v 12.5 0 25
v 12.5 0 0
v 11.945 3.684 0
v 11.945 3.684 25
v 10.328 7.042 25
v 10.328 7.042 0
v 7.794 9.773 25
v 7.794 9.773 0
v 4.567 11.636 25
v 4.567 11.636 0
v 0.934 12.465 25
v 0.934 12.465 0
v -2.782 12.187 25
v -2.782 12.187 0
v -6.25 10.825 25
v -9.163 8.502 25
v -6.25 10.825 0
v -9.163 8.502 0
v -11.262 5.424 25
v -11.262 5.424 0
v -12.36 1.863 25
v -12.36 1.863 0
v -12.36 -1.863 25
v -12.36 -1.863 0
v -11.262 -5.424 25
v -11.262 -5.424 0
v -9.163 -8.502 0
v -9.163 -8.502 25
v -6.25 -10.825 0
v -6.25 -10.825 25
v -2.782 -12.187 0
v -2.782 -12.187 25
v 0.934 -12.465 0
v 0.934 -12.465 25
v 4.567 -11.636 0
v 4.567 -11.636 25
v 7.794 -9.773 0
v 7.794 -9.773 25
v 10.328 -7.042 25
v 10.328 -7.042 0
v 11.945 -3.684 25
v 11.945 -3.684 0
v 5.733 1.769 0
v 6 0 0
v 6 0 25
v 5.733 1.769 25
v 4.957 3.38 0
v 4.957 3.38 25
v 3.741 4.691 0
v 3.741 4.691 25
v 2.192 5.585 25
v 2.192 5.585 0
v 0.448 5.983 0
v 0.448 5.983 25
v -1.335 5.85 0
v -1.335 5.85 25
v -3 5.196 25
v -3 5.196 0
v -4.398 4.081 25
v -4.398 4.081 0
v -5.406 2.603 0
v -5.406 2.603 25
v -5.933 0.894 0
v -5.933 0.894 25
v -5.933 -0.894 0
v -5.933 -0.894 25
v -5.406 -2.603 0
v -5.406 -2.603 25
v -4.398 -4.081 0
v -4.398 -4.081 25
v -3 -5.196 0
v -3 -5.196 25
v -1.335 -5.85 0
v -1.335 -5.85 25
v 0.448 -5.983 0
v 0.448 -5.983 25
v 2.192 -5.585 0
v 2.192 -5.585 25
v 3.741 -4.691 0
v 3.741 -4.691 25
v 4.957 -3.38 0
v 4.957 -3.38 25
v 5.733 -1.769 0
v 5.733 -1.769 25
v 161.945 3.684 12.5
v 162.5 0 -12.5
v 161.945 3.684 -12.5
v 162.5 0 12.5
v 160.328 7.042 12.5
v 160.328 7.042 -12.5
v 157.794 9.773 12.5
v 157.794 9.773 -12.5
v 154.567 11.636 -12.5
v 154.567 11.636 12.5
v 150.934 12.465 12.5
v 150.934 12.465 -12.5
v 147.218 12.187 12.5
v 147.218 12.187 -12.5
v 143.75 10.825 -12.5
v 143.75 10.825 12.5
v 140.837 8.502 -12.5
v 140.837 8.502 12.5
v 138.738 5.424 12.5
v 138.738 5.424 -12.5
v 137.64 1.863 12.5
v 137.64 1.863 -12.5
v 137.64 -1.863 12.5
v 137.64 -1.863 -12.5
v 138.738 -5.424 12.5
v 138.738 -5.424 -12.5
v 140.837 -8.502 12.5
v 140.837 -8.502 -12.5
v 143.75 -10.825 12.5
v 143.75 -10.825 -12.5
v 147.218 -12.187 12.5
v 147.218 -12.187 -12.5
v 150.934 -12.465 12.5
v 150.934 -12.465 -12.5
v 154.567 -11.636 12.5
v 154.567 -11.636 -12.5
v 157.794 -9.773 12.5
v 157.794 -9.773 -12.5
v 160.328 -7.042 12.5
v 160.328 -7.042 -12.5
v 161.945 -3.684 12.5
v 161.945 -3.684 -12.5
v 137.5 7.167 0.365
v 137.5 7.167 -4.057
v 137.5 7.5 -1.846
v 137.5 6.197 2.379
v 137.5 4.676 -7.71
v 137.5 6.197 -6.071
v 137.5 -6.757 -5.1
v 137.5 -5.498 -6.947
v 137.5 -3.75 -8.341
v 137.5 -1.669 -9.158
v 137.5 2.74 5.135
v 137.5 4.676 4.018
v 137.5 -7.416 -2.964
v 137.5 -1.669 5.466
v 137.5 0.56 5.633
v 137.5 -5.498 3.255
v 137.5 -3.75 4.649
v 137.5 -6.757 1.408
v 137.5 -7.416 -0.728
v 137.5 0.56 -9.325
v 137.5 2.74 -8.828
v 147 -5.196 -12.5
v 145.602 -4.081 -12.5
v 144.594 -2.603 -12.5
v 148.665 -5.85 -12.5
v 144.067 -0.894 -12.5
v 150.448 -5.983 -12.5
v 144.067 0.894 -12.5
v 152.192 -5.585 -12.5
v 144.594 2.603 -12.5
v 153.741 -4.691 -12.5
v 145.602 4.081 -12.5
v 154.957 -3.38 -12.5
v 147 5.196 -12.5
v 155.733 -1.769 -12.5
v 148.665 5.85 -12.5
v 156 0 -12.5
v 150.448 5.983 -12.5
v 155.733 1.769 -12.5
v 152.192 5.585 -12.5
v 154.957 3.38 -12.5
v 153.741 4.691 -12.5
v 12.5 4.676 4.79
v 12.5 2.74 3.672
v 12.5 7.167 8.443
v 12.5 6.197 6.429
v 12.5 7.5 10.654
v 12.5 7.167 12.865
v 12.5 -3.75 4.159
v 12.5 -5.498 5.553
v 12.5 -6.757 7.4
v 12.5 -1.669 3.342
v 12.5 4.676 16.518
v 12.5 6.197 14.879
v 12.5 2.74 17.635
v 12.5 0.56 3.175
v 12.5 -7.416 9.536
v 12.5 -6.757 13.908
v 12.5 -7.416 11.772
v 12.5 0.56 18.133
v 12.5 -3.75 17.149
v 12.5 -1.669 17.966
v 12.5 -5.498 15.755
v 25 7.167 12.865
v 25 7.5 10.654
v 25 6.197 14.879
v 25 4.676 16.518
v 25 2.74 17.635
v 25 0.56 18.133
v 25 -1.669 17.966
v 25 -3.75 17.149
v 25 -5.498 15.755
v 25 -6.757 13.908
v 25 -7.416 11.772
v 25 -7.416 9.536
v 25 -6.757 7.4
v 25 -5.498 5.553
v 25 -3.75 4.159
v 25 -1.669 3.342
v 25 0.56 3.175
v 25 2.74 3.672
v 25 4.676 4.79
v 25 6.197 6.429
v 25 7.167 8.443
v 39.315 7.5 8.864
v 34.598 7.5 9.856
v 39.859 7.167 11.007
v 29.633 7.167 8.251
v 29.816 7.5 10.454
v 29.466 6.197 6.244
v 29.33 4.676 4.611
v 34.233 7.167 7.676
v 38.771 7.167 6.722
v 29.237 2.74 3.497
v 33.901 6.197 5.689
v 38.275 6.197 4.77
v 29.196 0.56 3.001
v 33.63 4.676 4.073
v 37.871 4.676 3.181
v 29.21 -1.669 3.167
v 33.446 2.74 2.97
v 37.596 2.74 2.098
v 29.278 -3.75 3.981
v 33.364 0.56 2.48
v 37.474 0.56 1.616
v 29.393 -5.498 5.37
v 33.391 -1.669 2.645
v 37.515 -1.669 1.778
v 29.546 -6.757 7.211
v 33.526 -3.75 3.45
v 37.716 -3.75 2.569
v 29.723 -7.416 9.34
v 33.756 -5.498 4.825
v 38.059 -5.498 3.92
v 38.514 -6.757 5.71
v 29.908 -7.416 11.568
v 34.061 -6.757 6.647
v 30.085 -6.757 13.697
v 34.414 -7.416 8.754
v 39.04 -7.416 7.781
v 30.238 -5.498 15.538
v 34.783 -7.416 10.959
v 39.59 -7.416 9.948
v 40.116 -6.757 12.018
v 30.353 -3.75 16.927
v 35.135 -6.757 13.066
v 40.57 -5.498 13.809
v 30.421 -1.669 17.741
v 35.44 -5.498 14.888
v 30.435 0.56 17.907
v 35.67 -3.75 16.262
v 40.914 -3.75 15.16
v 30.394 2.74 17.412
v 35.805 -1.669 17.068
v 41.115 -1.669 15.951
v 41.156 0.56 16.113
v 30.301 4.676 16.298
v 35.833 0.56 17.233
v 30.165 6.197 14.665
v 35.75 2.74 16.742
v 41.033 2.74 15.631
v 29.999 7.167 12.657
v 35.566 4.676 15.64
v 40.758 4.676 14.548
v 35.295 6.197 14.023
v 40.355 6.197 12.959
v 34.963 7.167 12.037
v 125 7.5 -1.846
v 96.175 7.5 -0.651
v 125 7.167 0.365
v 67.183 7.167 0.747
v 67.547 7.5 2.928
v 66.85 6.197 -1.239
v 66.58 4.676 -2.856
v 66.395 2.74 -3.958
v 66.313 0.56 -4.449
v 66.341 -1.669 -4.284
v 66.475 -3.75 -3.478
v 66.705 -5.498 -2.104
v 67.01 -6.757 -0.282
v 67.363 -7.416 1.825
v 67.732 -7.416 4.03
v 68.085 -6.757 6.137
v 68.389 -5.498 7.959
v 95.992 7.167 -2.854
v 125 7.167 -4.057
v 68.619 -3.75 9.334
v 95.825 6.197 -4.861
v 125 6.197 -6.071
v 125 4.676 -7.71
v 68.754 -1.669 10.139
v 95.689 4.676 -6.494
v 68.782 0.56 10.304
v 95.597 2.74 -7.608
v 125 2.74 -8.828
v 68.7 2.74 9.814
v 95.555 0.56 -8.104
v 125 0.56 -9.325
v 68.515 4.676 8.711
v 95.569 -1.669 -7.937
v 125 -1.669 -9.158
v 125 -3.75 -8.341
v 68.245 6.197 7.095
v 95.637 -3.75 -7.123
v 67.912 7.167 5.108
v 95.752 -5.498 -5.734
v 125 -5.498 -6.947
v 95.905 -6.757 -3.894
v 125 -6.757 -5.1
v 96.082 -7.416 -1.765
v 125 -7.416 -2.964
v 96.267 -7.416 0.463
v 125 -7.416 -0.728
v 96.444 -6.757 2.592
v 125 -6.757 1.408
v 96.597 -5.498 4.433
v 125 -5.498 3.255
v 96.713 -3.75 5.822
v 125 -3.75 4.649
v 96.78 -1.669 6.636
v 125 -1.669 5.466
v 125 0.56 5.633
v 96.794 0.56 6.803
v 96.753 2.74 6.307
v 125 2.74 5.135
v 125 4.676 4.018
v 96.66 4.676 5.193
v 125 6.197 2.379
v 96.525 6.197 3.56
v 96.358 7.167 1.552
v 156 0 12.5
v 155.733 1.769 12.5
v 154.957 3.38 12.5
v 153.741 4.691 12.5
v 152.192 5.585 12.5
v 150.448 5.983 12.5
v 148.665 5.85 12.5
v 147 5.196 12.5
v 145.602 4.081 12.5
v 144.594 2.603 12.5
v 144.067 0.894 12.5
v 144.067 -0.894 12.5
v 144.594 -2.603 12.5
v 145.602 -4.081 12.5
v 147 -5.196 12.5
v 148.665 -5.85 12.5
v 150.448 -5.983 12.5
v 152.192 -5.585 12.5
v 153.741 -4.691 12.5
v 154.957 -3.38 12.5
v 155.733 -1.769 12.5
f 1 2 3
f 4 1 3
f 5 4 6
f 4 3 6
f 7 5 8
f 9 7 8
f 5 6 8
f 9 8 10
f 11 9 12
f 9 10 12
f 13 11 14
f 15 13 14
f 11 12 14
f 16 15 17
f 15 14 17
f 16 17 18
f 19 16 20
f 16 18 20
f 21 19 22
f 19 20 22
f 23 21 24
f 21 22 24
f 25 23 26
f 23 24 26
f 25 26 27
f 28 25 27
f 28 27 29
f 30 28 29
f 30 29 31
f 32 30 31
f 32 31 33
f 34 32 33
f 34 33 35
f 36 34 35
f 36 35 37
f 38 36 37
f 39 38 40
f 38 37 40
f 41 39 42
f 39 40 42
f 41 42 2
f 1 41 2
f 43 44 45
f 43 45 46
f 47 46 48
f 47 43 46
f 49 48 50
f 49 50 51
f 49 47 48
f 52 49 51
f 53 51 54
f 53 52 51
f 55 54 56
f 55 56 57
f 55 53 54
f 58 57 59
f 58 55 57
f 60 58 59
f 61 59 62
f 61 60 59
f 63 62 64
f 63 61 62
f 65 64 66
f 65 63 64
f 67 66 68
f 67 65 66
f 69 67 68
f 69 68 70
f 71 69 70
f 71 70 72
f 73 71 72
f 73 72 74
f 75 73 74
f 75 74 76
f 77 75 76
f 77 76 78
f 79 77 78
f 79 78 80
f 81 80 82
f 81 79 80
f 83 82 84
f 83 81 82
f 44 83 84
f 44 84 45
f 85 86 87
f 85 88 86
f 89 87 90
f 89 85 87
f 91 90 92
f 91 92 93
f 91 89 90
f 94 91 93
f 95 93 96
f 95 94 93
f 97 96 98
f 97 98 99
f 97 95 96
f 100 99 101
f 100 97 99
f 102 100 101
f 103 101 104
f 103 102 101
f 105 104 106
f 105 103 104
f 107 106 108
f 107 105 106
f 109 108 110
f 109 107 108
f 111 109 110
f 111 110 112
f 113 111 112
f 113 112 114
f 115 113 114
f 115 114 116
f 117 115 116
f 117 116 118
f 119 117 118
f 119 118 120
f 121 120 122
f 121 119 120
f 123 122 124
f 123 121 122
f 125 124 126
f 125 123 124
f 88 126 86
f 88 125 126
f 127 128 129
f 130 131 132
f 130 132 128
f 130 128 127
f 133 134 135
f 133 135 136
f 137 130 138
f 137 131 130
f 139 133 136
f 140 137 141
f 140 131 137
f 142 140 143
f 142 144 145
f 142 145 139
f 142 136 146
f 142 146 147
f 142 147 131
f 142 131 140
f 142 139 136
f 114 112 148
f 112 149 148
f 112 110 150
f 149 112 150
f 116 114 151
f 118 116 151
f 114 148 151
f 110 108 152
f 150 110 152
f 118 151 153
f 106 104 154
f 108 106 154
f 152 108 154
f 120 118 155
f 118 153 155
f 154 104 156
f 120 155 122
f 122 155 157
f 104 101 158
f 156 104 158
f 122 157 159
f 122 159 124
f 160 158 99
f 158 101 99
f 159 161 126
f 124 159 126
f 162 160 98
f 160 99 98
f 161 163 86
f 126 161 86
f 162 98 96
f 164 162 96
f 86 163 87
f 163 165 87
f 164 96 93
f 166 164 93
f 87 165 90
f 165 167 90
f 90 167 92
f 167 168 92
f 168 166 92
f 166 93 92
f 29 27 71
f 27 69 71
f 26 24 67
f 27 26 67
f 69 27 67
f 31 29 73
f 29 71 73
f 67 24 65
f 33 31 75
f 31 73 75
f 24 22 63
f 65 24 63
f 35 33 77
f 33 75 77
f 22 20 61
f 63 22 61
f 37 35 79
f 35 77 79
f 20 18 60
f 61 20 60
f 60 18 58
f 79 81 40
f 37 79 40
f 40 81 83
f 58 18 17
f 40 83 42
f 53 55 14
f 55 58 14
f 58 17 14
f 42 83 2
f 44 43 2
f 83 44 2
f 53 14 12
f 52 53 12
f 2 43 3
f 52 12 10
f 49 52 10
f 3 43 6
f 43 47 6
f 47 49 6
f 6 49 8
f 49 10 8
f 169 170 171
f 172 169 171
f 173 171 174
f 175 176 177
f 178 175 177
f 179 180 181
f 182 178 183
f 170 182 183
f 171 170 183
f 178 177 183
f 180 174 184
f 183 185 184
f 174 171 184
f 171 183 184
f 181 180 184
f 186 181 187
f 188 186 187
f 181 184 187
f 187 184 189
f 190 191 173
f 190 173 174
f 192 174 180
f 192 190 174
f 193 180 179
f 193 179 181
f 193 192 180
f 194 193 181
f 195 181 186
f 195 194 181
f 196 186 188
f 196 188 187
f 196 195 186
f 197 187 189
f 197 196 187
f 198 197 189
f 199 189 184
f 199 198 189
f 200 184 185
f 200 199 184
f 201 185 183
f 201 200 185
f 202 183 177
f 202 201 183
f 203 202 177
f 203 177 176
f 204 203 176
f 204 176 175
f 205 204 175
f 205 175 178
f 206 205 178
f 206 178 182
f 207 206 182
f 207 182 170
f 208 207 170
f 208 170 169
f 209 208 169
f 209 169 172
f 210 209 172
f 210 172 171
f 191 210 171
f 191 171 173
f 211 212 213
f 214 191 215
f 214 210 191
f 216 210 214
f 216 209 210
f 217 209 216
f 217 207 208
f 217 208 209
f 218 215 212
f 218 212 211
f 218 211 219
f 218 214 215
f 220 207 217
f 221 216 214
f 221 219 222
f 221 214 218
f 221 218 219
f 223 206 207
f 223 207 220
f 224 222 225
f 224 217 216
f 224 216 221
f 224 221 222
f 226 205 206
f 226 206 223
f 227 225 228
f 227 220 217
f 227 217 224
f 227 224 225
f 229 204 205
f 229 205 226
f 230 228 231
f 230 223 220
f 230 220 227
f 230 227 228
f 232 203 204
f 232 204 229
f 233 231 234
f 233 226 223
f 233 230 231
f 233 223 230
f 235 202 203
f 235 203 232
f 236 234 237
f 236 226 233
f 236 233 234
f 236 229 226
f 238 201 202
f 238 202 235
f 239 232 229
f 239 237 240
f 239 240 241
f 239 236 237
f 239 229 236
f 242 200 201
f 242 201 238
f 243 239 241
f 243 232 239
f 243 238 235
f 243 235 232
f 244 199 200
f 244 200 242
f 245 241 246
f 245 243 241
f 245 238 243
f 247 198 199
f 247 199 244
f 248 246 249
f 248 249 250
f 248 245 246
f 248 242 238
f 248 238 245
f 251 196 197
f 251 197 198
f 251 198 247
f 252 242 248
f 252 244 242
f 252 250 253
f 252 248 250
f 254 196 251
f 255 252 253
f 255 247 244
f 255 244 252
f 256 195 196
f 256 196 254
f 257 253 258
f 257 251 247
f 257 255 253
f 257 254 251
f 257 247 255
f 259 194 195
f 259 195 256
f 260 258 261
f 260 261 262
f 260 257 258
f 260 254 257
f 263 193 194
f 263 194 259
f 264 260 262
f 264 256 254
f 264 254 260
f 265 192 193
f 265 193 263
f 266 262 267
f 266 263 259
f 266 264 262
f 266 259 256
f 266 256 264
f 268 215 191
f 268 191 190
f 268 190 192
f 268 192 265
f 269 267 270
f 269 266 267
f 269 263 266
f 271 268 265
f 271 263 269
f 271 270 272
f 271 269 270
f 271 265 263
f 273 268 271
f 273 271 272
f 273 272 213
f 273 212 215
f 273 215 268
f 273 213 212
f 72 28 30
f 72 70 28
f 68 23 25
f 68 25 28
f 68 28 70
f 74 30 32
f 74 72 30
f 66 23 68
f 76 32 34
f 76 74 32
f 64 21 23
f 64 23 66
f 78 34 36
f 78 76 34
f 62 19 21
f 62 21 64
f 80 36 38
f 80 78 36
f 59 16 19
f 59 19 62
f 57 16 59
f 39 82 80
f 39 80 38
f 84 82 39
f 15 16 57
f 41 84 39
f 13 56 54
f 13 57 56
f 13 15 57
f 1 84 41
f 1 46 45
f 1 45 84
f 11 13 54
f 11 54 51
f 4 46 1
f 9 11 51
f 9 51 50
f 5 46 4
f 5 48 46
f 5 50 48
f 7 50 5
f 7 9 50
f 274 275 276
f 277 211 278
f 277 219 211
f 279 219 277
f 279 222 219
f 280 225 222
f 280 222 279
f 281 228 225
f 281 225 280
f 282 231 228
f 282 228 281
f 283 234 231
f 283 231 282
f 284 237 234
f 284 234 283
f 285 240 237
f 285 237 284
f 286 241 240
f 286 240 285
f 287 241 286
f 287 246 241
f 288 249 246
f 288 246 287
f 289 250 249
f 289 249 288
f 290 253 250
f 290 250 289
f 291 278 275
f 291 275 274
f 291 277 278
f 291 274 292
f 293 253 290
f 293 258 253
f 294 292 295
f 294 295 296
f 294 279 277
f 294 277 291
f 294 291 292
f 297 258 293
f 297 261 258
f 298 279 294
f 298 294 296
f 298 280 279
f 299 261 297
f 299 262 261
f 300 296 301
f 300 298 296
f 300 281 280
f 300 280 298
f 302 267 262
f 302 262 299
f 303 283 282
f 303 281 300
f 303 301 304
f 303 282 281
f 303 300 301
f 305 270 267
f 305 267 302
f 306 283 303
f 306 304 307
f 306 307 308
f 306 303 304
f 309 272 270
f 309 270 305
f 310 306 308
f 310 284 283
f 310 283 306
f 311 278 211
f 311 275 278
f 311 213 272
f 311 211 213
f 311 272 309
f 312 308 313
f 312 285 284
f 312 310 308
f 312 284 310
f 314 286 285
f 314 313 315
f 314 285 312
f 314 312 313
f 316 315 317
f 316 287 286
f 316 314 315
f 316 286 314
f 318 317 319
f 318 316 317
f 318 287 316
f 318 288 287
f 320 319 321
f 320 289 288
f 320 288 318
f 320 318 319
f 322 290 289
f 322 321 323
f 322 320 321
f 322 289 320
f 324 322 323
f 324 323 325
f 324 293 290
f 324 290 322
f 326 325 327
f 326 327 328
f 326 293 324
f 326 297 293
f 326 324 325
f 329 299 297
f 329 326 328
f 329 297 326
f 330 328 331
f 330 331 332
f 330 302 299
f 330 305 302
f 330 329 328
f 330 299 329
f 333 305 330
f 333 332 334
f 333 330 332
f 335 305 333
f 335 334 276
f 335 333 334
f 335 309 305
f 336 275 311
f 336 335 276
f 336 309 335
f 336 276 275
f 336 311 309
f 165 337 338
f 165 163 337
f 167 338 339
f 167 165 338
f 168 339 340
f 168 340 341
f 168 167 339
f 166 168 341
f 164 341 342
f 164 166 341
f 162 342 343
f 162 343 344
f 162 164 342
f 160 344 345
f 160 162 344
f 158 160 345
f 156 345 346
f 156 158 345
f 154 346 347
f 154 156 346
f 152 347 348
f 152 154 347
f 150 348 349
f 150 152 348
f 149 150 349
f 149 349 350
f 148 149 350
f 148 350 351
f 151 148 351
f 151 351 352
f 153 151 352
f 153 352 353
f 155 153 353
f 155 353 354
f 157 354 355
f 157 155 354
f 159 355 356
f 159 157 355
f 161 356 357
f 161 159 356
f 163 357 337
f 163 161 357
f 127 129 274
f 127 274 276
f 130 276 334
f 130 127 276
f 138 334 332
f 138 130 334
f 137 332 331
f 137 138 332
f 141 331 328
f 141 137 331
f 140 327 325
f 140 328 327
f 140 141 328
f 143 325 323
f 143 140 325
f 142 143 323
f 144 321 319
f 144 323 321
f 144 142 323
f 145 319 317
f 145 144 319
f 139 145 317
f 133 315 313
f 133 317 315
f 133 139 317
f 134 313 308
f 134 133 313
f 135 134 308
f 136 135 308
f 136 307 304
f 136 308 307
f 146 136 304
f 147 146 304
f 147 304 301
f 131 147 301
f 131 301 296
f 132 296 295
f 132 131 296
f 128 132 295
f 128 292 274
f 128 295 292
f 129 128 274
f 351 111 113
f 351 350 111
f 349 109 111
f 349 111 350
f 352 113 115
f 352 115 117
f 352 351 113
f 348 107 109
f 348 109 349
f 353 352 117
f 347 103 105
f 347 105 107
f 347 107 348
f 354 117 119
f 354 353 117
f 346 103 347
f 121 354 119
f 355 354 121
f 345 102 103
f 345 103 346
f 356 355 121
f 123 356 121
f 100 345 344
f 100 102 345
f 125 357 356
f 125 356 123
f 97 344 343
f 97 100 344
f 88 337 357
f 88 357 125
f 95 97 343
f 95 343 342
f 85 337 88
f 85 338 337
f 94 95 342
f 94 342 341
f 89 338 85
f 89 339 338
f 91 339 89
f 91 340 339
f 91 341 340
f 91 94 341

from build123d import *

# Parameters (mm, degrees)
F0_R     = 12.5
F0_R_2   = 6
F1_DEPTH = 25
F2_R     = 12.5
F2_R_2   = 6
F3_DEPTH = 12.5
F6_R     = 7.5


with BuildPart() as f1:
    # F0 (on Top) → F1 (new body)
    with BuildSketch(Plane.XY):
        Circle(F0_R)
        Circle(F0_R_2, mode=Mode.SUBTRACT)
    extrude(amount=F1_DEPTH)


with BuildPart() as f3:
    # F2 (on Top) → F3 (new body, symmetric)
    with BuildSketch(Plane.XY):
        with Locations((150, 0)):
            Circle(F2_R)
        with Locations((150, 0)):
            Circle(F2_R_2, mode=Mode.SUBTRACT)
    extrude(amount=F3_DEPTH, both=True)


with BuildPart() as f7:
    # F7: sweep along a path in F4
    with BuildLine(Plane.XZ) as f7_path:
        Line((12.5, 12.5), (25, 12.5))
        ThreePointArc((25, 12.5), (32.4420840754, 12.0366726028), (39.7692307692, 10.6538461538))
        ThreePointArc((39.7692307692, 10.6538461538), (82.0529731485, 2.6737851879), (125, 0))
        Line((125, 0), (137.5, 0))
    # F6 (on offset) → F7 (sweep)
    with BuildSketch(Plane.YZ.offset(12.5)):
        with Locations((0, 10.6538461538)):
            Circle(F6_R)
    sweep(path=f7_path.line)


solid = Compound([f1.part, f3.part, f7.part])
